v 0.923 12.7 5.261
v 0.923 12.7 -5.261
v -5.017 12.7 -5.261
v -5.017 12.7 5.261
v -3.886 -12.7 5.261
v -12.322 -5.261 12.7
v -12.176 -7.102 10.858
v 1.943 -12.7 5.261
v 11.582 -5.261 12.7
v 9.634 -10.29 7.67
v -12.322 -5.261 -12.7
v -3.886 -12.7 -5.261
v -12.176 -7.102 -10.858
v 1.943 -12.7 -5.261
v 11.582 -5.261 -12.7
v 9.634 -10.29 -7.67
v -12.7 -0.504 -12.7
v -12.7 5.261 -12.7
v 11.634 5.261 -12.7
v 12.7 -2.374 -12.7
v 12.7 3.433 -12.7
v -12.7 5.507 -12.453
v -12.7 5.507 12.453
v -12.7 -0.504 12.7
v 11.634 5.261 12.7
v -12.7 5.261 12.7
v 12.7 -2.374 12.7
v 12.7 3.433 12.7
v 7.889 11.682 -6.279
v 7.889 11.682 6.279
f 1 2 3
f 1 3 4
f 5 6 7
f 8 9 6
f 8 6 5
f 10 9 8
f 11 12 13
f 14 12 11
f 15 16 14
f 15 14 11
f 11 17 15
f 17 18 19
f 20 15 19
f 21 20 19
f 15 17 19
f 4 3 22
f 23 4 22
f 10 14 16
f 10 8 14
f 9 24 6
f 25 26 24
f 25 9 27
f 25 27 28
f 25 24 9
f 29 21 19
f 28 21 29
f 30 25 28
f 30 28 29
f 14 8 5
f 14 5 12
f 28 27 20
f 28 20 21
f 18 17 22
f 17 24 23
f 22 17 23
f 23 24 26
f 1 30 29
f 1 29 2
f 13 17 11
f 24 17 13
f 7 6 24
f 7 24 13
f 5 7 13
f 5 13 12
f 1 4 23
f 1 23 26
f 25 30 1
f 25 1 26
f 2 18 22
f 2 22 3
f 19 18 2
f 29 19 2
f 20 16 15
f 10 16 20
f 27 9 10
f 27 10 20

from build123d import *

# Parameters (mm, degrees)
F1_DEPTH = 12.7
F3_DEPTH = 12.7


with BuildPart() as f1:
    # F0 (on Top) → F1 (new body, symmetric)
    with BuildSketch(Plane.XY):
        Polygon((7.88855, 11.681875), (-4.214828, 13.451047), (-13.144354, 5.091305), (-12.175913, -7.102293), (-2.038762, -13.947719), (9.633619, -10.290229), (14.051688, 1.116014), align=None)
    extrude(amount=F1_DEPTH, both=True)

    # F2 (on Right) → F3 (intersect, symmetric)
    with BuildSketch(Plane.YZ):
        Polygon((5.260512, 12.7), (-5.260512, 12.7), (-12.7, 5.260512), (-12.7, -5.260512), (-5.260512, -12.7), (5.260512, -12.7), (12.7, -5.260512), (12.7, 5.260512), align=None)
    extrude(amount=F3_DEPTH, both=True, mode=Mode.INTERSECT)


solid = f1.part
